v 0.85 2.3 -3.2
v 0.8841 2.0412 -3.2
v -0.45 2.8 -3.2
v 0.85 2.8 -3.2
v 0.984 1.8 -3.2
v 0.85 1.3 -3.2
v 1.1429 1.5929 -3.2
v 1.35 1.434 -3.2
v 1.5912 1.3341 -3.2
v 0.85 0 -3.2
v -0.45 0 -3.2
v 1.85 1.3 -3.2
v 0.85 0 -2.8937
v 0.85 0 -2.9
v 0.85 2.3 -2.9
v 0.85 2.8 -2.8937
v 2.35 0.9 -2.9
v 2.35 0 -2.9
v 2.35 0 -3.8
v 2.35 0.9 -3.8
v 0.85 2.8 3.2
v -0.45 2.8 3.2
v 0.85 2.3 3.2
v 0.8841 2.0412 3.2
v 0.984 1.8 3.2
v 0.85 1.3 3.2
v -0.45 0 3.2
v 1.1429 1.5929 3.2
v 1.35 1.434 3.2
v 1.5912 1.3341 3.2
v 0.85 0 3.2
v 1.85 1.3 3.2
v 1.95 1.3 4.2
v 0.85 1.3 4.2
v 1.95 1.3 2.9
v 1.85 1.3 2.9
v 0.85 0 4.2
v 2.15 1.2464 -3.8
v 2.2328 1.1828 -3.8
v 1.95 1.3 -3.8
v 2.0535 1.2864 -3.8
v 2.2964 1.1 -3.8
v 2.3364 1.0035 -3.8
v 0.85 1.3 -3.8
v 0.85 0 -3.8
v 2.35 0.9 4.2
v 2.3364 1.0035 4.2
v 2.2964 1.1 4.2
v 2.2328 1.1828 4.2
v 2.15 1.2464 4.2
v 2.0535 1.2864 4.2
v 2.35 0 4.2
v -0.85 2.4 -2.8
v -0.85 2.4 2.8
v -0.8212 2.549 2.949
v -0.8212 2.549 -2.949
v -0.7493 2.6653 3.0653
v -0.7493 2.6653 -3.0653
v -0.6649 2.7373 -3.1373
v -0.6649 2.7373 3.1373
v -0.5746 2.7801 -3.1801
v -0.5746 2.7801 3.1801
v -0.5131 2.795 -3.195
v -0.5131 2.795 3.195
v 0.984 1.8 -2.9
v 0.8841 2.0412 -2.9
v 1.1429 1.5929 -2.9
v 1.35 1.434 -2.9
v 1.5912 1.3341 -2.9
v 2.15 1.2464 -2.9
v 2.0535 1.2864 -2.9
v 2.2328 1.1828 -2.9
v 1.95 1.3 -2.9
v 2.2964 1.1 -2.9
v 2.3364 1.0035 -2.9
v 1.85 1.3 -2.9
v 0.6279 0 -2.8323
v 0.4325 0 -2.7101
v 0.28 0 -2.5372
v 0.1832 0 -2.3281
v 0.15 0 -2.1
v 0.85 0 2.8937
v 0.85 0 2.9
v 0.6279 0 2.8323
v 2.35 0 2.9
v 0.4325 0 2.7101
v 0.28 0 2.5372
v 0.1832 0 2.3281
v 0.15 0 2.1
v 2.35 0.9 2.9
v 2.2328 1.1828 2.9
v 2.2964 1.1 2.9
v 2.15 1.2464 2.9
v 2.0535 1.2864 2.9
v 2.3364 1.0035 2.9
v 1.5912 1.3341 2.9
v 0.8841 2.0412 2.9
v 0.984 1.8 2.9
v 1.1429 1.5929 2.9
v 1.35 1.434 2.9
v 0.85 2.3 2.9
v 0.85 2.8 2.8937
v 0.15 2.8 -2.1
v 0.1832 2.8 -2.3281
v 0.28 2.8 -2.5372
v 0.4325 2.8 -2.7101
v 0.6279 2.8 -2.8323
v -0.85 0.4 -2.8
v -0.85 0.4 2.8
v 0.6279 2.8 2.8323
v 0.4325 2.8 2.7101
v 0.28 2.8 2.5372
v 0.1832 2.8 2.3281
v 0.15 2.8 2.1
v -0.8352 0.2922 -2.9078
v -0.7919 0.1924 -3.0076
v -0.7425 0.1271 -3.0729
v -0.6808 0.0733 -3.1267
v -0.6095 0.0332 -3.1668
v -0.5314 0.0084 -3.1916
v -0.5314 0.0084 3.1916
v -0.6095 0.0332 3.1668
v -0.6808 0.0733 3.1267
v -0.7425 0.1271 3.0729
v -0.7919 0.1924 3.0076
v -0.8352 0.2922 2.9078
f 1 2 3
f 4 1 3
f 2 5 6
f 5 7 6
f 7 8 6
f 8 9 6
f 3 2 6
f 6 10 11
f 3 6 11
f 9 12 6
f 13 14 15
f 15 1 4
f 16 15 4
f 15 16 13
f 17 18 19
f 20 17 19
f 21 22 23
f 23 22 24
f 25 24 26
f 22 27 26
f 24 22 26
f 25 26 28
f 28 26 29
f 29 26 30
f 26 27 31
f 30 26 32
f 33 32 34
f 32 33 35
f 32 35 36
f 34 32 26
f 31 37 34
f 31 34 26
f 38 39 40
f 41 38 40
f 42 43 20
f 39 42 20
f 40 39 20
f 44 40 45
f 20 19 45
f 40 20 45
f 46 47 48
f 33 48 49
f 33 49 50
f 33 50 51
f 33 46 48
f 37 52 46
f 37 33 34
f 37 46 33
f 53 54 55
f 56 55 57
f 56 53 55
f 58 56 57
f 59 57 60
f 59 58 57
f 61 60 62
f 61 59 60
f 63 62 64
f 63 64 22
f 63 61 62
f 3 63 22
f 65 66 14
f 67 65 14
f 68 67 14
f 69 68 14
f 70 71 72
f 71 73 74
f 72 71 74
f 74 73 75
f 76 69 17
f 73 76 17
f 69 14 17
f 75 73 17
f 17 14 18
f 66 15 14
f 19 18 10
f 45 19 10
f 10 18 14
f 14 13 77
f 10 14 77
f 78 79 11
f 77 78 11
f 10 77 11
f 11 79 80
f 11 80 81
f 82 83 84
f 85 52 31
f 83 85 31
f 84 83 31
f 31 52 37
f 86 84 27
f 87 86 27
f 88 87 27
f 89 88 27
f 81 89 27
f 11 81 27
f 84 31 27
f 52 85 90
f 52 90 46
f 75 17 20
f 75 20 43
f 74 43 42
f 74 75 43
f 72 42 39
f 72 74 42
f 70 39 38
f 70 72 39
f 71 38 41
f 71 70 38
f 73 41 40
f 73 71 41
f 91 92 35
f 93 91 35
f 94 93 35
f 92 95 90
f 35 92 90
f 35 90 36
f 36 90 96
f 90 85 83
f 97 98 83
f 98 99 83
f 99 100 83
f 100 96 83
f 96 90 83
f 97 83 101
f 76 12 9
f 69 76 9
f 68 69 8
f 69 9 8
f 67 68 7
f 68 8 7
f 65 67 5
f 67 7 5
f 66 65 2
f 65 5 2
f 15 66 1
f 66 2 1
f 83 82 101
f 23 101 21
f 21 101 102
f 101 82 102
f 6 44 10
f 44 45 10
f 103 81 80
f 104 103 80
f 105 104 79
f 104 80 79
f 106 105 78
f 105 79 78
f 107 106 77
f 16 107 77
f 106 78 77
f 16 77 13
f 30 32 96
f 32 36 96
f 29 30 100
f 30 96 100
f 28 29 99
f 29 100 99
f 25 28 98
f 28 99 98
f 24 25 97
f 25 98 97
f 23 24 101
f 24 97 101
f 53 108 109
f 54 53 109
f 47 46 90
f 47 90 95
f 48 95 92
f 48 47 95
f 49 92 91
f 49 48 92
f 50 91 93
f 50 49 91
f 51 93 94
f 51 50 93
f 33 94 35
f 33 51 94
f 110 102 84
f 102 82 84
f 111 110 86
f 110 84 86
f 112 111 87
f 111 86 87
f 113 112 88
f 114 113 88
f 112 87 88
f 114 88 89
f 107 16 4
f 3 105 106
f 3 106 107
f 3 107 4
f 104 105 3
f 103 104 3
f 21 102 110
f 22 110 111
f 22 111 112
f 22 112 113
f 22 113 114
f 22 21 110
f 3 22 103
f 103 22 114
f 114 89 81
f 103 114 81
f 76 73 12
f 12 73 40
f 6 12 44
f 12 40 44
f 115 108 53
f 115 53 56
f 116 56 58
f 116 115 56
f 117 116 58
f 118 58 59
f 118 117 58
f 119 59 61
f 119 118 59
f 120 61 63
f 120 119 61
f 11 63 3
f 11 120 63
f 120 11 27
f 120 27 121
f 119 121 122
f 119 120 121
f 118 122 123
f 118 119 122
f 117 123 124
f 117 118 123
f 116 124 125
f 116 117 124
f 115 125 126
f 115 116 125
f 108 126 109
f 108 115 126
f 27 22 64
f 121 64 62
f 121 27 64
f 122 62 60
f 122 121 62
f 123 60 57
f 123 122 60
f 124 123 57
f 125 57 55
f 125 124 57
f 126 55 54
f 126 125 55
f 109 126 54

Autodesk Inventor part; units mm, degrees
ref_plane "YZ Plane" through (0, 0, 0) normal (1, 0, 0) x (0, 1, 0)
ref_plane "XZ Plane" through (0, 0, 0) normal (0, 1, 0) x (-1, 0, 0)
ref_plane "XY Plane" through (0, 0, 0) normal (0, 0, 1) x (1, 0, 0)
sketch "Sketch1" plane through (0, 0, 0) normal (0, 1, 0) x (-1, 0, 0)
  line L0 (0.85, 3.2) -> (-0.85, 3.2)
  line L1 (-0.85, 3.2) -> (-0.85, -3.2)
  line L2 (-0.85, -3.2) -> (0.85, -3.2)
  line L3 (0.85, -3.2) -> (0.85, 3.2)
  line L4 (0.85, 3.2) -> (-0.85, -3.2) construction
  line L5 (-0.85, 3.2) -> (0.85, -3.2) construction
  line L6 (-0.85, -1.3) -> (-2.35, -1.3) construction
  line L7 (-2.35, -1.3) -> (-2.35, -3.4525)
  line L8 (-0.85, -3.2) -> (-0.85, -1.3)
  line L9 (-2.35, -3.4525) -> (-2.35, -3.8)
  line L10 (-2.35, -3.8) -> (-0.85, -3.8)
  line L11 (-0.85, -3.8) -> (-0.85, -3.2)
  line L12 (-2.35, -2.9) -> (-0.85, -2.9)
  line L13 (0, 0) -> (-4.1965, 0) construction
  line L14 (-2.35, 1.3) -> (-2.35, 3.4525)
  line L15 (-2.35, 2.9) -> (-0.85, 2.9)
  line L16 (-0.85, 2.9) -> (-2.35, 2.9)
  line L17 (-2.35, 2.9) -> (-2.35, 4.2)
  line L18 (-2.35, 4.2) -> (-0.85, 4.2)
  line L19 (-0.85, 4.2) -> (-0.85, 2.9)
  line L20 (-0.85, 2.9) -> (-0.15, 2.9)
  line L21 (-0.15, 2.9) -> (-0.15, -2.9)
  line L22 (-0.15, -2.9) -> (-0.85, -2.9)
  line L23 (-0.85, -2.9) -> (-0.85, 2.9)
  point P0 (-0.85, 2.9)
  point P1 (-0.85, -2.9)
  point P2 (-2.35, 3.4525)
  point P3 (-0.85, 2.9)
  point P4 (-0.85, -2.9)
  dimension "d0" = 1.3
  dimension "d2" = 1.7
  dimension "d3" = 1.5
  dimension "d5" = 1.9
  dimension "d7" = 2.9
  dimension "d13" = 1
  dimension "d14" = 2.5
  dimension "d18" = 0.7
extrude "Extrusion1" add sketch "Sketch1" along normal blind 2.8 contours L3 L2 L1 L22 L21 L20 L0 | L1 L15 L14 L17 L18 L19 | L11 L10 L9 L7 L12 L1
sketch "Sketch2" plane through (0, 0, 0) normal (0, 0, 1) x (1, 0, 0)
  line L0 (0.85, 2.8) -> (2.35, 2.8)
  line L1 (2.35, 2.8) -> (2.35, 1.3)
  line L2 (2.35, 1.3) -> (0.85, 1.3)
  line L3 (0.85, 1.3) -> (0.85, 2.8)
  line L4 (2.35, 0) -> (2.35, 2.8) projected
  line L5 (0.85, 0) -> (0.85, 2.8) projected
  line L6 (0.85, 2.8) -> (2.35, 2.8) projected
  dimension "d15" = 1.5
extrude "Extrusion2" cut sketch "Sketch2" along normal through all both and the other way through all
fillet "Fillet1" radius 0.8 2 edges at (0.15, 1.4, -2.9) (0.15, 1.4, 2.9)
fillet "Fillet1" radius 1 2 edges at (0.85, 1.3, 3.05) (0.85, 1.3, -3.05)
fillet "Fillet1" radius 0.4 2 edges at (2.35, 1.3, 3.55) (2.35, 1.3, -3.35)
fillet "Fillet1" radius 0.4 4 edges at (-0.85, 2.8, 0) (-0.85, 0, 0) (-0.85, 1.4, -3.2) (-0.85, 1.4, 3.2)
equation "\"button_height\" = 1.3"
properties part number "Button"
